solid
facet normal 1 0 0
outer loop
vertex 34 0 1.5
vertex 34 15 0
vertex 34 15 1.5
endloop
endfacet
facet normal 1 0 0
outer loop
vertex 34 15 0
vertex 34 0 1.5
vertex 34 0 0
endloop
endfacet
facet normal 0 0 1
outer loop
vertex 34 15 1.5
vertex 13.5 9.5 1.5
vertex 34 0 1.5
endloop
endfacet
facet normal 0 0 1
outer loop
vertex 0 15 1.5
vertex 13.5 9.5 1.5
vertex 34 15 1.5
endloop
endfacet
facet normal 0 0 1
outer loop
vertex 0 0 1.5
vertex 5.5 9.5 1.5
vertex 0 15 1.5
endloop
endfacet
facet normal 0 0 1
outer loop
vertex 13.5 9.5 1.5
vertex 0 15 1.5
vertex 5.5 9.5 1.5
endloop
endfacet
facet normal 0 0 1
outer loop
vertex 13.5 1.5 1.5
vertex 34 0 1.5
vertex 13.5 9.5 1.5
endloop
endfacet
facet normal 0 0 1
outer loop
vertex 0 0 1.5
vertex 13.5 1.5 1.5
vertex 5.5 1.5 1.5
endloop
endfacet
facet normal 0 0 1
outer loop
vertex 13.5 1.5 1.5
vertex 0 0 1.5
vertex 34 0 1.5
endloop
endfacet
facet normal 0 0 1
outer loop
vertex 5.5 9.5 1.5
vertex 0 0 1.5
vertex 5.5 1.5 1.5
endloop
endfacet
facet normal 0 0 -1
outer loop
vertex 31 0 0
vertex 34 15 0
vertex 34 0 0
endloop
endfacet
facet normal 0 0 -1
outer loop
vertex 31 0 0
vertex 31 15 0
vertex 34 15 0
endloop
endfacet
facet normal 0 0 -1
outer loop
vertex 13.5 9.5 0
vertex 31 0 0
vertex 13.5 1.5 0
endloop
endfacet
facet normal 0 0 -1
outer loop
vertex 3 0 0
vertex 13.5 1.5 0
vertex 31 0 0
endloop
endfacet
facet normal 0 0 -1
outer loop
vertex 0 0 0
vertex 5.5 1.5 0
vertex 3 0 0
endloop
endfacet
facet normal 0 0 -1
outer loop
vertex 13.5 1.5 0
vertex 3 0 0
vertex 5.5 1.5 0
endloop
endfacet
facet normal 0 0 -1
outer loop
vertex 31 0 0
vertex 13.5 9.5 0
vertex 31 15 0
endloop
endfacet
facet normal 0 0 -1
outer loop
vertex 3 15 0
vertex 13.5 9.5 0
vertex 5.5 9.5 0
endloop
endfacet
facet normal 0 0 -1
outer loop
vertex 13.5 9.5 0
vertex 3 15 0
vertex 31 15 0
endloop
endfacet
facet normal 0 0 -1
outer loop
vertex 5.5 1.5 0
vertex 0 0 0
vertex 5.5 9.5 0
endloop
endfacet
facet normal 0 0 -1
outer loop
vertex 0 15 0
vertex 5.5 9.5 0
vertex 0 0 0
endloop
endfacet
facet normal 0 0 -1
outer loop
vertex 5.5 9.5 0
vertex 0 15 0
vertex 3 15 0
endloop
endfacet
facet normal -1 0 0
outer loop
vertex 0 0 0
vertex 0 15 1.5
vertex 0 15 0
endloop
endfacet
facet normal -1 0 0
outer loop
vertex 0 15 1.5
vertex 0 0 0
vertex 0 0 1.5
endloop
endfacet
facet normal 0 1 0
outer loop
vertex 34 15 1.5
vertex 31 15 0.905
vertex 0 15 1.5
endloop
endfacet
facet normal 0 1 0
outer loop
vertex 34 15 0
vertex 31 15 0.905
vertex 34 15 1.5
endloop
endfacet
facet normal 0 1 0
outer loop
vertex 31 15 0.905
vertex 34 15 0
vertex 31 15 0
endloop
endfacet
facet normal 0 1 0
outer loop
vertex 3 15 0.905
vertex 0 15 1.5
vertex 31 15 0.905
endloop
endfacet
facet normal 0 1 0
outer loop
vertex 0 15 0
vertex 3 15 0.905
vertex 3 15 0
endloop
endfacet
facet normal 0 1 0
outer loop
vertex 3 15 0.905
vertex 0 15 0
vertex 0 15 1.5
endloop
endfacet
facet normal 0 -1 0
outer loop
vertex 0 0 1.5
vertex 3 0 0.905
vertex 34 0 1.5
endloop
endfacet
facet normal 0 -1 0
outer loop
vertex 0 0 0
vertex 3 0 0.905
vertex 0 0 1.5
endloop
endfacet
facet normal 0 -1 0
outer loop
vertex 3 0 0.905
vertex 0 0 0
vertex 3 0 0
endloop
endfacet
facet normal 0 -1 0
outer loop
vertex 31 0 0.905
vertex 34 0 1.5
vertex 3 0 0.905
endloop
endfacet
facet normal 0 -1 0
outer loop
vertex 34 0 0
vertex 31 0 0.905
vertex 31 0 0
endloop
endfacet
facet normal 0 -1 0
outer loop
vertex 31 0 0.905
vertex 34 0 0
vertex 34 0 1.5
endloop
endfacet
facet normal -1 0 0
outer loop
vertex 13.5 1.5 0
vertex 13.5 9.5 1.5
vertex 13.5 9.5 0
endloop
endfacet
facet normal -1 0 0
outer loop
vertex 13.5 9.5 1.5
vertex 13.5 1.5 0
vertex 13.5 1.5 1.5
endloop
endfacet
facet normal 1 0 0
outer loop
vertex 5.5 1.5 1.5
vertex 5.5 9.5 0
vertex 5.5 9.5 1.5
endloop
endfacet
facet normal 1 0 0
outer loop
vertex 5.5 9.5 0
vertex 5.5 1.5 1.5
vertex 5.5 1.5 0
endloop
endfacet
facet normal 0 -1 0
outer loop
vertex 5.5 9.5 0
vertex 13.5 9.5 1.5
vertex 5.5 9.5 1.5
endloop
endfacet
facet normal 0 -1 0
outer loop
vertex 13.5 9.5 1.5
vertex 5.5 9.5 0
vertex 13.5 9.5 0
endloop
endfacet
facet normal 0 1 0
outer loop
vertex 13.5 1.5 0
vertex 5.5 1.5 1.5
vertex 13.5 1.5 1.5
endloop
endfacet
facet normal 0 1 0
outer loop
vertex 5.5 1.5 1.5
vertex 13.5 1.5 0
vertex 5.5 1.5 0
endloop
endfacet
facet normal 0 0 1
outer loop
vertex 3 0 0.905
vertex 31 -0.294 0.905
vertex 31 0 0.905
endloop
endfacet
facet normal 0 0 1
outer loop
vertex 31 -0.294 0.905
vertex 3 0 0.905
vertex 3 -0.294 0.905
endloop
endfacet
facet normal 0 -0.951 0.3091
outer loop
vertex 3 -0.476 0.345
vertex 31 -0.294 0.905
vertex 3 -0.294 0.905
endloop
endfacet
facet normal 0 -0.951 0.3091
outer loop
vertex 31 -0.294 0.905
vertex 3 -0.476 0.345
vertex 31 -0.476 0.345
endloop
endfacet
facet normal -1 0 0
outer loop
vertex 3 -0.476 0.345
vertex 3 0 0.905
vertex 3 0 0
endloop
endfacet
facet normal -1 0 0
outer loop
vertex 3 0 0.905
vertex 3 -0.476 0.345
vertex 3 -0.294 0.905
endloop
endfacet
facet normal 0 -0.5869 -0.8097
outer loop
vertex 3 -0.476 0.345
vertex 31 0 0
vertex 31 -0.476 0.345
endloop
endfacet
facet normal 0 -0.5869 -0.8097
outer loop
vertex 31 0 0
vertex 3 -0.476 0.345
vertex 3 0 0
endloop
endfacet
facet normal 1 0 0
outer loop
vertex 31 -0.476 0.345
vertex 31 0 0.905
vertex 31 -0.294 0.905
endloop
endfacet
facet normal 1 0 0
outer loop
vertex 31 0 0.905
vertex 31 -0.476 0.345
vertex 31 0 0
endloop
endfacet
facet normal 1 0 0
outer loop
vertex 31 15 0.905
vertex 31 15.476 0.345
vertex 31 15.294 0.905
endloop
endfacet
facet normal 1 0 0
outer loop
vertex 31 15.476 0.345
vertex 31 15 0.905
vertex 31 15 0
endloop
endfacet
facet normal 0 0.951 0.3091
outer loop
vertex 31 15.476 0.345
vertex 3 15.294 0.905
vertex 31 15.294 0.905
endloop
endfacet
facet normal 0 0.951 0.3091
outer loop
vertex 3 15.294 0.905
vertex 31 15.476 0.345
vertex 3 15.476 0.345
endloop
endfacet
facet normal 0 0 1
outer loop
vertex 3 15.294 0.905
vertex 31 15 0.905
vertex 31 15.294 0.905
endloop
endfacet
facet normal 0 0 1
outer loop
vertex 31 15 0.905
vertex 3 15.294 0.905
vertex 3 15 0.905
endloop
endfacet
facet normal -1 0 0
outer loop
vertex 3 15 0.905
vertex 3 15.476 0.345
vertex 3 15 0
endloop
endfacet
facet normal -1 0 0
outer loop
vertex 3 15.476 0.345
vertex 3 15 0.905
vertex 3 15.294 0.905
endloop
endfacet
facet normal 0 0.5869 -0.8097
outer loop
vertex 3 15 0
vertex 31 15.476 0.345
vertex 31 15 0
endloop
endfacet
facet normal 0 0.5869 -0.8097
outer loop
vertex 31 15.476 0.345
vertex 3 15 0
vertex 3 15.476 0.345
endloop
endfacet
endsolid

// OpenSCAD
hyla=6;
hala=7;
h=hyla + hala + 2;
w=28;
l=60;
wall=3;
lidheight=1.5;

sisa =  [w,l,h];
ulko = [for (i = sisa) i+wall*2];
usb = [9,4,wall];

translate([wall,0,0.5]) {
rotate([0,90,0]) 
cylinder(r=0.5,h=w);}

difference () {
holed=8;    
cube([w+wall*2,h,lidheight]);
translate ([(wall+2.5+holed/2-holed/2), (hyla+1-0.5-holed/2 -1 ), 0]) 
    cube(holed,h=10);    
}

translate([wall,h,0.5]) {
rotate([0,90,0]) 
cylinder(r=0.5,h=w);
    }
